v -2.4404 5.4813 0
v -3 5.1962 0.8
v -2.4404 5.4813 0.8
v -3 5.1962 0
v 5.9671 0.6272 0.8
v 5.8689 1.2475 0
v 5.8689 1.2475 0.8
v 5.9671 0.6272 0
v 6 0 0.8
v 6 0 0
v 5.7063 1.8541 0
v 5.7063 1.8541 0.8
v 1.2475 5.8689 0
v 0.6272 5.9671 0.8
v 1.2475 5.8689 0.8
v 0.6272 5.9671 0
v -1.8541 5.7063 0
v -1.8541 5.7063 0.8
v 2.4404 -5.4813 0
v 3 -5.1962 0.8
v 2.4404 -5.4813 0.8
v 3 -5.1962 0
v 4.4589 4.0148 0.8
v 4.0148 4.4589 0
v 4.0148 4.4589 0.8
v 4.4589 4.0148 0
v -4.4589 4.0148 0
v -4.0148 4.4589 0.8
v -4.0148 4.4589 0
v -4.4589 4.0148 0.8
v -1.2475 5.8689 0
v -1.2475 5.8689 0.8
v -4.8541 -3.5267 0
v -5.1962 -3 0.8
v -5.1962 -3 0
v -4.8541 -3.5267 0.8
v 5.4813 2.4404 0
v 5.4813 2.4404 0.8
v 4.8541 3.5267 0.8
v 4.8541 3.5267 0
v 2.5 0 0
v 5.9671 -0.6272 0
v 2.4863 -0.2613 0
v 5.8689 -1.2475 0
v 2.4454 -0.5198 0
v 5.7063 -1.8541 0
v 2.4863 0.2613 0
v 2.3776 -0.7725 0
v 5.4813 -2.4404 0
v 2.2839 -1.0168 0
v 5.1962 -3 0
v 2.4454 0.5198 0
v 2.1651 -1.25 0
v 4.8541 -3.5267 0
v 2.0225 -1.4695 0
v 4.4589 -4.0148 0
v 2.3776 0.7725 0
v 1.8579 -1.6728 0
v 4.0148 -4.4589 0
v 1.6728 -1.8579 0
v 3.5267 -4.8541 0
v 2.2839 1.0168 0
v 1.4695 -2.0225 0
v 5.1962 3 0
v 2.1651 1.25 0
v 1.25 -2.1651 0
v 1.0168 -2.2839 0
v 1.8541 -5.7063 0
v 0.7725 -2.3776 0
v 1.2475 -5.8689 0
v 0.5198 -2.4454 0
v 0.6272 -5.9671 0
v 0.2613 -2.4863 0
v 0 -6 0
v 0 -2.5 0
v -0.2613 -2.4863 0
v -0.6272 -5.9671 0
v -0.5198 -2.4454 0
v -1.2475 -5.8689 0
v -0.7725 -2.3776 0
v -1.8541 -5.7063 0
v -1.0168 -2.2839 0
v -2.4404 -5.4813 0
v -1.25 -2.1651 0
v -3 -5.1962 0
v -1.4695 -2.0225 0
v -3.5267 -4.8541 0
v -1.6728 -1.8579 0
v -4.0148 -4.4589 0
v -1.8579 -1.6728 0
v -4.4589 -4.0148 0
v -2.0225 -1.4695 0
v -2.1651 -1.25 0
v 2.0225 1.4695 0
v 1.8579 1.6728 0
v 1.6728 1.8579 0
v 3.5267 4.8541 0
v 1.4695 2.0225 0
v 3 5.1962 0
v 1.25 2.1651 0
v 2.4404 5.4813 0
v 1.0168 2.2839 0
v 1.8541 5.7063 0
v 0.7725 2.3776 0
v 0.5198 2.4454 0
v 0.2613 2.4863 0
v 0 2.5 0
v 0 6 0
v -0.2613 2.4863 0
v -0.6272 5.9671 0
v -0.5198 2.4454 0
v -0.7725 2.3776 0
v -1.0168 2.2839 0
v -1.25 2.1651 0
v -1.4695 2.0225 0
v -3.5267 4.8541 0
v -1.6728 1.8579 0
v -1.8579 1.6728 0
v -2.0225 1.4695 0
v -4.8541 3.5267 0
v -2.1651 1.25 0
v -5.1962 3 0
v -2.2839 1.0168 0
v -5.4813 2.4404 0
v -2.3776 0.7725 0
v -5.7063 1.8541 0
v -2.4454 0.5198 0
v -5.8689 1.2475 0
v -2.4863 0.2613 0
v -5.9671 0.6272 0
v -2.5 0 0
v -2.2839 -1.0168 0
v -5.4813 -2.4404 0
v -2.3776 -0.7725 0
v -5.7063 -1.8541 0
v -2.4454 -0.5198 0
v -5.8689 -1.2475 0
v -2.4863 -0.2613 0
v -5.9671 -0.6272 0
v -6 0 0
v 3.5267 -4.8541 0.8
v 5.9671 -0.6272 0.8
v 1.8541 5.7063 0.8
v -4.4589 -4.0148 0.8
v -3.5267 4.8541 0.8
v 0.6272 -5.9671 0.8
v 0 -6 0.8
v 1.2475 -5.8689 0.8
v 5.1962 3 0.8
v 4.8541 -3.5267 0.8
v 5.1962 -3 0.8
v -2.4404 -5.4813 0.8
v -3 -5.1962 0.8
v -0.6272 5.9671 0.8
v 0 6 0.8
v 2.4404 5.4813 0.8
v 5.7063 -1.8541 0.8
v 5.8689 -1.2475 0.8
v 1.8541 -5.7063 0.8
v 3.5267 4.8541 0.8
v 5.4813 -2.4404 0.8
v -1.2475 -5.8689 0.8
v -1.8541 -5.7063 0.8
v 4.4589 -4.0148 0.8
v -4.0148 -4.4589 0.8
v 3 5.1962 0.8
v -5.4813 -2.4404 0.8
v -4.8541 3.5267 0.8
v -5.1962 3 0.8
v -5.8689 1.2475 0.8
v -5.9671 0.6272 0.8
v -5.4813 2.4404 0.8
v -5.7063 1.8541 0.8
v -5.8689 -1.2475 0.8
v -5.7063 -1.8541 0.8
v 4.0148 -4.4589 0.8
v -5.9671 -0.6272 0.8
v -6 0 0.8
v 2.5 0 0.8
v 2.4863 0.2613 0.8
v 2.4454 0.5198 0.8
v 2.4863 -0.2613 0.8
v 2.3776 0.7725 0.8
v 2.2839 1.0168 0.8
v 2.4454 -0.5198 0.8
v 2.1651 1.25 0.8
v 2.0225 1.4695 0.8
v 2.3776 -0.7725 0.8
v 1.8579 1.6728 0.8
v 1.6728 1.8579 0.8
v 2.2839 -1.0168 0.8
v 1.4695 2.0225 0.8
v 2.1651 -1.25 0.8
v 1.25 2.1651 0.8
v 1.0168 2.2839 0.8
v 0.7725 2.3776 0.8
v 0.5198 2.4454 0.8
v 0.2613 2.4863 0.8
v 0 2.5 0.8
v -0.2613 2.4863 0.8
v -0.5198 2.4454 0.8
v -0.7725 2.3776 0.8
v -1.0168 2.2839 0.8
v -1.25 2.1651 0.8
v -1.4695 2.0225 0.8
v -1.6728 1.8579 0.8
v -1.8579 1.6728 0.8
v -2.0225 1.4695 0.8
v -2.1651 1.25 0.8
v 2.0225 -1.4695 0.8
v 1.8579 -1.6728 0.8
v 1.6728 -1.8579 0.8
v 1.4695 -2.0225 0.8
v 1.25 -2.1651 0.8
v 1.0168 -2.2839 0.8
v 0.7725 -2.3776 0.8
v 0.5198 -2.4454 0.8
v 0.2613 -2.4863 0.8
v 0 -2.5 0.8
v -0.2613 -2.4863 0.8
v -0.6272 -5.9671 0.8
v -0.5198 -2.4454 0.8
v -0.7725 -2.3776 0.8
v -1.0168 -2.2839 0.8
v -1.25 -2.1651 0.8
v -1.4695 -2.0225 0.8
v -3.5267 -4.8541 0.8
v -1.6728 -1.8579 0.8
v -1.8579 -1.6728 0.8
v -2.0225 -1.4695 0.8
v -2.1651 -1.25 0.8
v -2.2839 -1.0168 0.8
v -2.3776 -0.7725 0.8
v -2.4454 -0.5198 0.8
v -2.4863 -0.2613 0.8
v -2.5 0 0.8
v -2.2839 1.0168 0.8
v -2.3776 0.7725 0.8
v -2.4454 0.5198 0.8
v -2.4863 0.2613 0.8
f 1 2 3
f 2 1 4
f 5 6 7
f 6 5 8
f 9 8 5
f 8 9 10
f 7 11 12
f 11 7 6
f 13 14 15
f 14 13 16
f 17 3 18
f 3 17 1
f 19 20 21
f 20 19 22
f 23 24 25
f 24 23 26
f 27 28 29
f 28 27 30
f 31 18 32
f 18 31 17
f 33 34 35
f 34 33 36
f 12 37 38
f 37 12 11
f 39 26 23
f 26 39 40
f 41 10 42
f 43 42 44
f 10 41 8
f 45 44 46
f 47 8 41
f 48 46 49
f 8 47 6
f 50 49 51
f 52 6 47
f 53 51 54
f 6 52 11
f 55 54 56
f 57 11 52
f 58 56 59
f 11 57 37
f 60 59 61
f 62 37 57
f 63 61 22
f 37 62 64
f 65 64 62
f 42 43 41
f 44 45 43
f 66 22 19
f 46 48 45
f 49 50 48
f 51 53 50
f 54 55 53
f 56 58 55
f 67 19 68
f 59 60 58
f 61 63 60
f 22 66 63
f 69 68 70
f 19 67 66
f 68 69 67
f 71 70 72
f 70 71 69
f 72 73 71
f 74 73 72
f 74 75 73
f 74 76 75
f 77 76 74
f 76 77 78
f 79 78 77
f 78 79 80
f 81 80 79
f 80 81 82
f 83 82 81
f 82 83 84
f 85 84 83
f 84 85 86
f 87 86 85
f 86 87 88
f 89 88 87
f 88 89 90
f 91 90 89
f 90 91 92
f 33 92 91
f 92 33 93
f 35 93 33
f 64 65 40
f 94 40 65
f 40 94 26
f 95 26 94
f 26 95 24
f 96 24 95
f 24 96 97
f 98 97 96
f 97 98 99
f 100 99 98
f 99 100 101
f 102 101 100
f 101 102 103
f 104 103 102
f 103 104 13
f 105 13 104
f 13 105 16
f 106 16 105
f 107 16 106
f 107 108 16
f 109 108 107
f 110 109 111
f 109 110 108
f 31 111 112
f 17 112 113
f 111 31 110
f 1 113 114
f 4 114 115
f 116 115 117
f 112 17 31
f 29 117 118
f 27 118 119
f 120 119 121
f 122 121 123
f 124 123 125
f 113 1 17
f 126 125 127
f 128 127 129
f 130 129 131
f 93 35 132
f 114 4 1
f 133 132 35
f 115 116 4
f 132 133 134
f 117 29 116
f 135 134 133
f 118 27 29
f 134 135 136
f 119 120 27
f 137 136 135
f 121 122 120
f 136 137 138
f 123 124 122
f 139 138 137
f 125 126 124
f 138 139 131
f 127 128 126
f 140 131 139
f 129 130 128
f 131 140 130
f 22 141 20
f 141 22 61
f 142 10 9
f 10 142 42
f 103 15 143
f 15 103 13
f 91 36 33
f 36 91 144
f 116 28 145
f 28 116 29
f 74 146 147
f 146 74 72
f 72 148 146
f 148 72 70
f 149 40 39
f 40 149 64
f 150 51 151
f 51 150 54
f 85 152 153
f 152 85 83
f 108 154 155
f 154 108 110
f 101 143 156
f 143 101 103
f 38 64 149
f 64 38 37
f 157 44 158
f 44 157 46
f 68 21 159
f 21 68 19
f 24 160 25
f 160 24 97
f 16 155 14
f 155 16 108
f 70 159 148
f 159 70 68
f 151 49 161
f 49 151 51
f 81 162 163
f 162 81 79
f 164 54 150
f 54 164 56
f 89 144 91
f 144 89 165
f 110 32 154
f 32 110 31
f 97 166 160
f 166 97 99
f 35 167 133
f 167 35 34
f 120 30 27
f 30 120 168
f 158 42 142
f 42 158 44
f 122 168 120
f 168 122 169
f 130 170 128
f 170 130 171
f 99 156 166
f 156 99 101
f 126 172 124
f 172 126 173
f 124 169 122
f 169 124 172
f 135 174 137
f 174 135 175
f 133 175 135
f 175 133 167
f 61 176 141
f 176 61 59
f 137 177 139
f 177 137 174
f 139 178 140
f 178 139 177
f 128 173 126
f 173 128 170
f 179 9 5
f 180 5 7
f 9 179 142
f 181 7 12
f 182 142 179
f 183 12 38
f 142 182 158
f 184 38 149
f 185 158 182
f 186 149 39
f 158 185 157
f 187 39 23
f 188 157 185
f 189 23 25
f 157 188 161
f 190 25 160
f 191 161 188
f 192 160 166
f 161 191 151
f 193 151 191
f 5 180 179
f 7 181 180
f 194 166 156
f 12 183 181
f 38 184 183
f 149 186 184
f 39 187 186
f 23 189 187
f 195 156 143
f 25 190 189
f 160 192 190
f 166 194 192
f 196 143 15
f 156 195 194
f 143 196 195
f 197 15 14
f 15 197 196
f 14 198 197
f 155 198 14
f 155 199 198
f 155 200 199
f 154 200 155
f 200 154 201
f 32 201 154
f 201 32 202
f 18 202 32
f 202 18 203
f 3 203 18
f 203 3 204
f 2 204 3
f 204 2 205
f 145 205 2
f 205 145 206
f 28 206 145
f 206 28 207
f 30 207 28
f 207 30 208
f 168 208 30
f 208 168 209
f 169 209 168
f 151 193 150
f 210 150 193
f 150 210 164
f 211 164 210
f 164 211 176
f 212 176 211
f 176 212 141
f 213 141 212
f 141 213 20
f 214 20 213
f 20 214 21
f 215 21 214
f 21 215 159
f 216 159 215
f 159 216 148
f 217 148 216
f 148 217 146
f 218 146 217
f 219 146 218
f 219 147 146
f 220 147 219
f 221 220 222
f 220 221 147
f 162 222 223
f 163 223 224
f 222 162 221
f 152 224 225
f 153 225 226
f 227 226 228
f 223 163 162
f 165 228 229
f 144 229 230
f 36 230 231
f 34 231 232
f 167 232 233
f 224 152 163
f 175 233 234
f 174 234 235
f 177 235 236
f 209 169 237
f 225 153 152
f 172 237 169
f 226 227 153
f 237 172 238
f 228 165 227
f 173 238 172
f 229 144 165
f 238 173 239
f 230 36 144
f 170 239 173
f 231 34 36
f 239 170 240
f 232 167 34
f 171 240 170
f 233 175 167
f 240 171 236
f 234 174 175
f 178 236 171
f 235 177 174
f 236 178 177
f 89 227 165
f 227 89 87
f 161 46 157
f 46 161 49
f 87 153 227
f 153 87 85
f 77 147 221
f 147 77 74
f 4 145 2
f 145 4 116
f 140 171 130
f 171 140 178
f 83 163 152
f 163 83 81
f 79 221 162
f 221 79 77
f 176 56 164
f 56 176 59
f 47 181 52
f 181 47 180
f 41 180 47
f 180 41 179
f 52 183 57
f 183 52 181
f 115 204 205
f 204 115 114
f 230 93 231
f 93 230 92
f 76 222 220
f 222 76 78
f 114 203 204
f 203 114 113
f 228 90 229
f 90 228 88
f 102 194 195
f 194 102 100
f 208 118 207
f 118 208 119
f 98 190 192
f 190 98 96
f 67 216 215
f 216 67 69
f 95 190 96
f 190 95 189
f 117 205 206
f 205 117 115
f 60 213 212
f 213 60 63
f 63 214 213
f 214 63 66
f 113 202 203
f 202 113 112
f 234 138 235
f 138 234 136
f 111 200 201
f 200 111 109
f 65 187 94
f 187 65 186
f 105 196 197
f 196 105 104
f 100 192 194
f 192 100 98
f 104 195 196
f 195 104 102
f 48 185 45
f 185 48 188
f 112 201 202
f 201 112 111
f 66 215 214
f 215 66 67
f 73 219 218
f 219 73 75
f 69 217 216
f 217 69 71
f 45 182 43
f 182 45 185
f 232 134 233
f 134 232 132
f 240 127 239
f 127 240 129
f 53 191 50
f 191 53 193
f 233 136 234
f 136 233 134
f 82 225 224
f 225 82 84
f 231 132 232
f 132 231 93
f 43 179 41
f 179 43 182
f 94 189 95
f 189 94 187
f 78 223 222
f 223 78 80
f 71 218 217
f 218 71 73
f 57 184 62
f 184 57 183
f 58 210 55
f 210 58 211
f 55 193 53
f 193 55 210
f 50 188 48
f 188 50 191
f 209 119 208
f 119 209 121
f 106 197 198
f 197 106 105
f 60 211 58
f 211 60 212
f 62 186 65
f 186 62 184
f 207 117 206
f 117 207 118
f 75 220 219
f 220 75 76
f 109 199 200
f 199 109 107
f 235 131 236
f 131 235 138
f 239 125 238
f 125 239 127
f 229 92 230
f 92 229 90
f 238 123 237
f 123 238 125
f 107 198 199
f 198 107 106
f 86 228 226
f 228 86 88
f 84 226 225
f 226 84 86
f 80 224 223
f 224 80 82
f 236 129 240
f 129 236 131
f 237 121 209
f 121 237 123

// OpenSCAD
// Precision shim ring.
$fn = 60;
eps = 0.02;
inner_d = 5;
outer_d = 12;
thickness = 0.8;
difference() {
    cylinder(d = outer_d, h = thickness);
    translate([0, 0, -eps]) cylinder(d = inner_d, h = thickness + 2 * eps);
}
